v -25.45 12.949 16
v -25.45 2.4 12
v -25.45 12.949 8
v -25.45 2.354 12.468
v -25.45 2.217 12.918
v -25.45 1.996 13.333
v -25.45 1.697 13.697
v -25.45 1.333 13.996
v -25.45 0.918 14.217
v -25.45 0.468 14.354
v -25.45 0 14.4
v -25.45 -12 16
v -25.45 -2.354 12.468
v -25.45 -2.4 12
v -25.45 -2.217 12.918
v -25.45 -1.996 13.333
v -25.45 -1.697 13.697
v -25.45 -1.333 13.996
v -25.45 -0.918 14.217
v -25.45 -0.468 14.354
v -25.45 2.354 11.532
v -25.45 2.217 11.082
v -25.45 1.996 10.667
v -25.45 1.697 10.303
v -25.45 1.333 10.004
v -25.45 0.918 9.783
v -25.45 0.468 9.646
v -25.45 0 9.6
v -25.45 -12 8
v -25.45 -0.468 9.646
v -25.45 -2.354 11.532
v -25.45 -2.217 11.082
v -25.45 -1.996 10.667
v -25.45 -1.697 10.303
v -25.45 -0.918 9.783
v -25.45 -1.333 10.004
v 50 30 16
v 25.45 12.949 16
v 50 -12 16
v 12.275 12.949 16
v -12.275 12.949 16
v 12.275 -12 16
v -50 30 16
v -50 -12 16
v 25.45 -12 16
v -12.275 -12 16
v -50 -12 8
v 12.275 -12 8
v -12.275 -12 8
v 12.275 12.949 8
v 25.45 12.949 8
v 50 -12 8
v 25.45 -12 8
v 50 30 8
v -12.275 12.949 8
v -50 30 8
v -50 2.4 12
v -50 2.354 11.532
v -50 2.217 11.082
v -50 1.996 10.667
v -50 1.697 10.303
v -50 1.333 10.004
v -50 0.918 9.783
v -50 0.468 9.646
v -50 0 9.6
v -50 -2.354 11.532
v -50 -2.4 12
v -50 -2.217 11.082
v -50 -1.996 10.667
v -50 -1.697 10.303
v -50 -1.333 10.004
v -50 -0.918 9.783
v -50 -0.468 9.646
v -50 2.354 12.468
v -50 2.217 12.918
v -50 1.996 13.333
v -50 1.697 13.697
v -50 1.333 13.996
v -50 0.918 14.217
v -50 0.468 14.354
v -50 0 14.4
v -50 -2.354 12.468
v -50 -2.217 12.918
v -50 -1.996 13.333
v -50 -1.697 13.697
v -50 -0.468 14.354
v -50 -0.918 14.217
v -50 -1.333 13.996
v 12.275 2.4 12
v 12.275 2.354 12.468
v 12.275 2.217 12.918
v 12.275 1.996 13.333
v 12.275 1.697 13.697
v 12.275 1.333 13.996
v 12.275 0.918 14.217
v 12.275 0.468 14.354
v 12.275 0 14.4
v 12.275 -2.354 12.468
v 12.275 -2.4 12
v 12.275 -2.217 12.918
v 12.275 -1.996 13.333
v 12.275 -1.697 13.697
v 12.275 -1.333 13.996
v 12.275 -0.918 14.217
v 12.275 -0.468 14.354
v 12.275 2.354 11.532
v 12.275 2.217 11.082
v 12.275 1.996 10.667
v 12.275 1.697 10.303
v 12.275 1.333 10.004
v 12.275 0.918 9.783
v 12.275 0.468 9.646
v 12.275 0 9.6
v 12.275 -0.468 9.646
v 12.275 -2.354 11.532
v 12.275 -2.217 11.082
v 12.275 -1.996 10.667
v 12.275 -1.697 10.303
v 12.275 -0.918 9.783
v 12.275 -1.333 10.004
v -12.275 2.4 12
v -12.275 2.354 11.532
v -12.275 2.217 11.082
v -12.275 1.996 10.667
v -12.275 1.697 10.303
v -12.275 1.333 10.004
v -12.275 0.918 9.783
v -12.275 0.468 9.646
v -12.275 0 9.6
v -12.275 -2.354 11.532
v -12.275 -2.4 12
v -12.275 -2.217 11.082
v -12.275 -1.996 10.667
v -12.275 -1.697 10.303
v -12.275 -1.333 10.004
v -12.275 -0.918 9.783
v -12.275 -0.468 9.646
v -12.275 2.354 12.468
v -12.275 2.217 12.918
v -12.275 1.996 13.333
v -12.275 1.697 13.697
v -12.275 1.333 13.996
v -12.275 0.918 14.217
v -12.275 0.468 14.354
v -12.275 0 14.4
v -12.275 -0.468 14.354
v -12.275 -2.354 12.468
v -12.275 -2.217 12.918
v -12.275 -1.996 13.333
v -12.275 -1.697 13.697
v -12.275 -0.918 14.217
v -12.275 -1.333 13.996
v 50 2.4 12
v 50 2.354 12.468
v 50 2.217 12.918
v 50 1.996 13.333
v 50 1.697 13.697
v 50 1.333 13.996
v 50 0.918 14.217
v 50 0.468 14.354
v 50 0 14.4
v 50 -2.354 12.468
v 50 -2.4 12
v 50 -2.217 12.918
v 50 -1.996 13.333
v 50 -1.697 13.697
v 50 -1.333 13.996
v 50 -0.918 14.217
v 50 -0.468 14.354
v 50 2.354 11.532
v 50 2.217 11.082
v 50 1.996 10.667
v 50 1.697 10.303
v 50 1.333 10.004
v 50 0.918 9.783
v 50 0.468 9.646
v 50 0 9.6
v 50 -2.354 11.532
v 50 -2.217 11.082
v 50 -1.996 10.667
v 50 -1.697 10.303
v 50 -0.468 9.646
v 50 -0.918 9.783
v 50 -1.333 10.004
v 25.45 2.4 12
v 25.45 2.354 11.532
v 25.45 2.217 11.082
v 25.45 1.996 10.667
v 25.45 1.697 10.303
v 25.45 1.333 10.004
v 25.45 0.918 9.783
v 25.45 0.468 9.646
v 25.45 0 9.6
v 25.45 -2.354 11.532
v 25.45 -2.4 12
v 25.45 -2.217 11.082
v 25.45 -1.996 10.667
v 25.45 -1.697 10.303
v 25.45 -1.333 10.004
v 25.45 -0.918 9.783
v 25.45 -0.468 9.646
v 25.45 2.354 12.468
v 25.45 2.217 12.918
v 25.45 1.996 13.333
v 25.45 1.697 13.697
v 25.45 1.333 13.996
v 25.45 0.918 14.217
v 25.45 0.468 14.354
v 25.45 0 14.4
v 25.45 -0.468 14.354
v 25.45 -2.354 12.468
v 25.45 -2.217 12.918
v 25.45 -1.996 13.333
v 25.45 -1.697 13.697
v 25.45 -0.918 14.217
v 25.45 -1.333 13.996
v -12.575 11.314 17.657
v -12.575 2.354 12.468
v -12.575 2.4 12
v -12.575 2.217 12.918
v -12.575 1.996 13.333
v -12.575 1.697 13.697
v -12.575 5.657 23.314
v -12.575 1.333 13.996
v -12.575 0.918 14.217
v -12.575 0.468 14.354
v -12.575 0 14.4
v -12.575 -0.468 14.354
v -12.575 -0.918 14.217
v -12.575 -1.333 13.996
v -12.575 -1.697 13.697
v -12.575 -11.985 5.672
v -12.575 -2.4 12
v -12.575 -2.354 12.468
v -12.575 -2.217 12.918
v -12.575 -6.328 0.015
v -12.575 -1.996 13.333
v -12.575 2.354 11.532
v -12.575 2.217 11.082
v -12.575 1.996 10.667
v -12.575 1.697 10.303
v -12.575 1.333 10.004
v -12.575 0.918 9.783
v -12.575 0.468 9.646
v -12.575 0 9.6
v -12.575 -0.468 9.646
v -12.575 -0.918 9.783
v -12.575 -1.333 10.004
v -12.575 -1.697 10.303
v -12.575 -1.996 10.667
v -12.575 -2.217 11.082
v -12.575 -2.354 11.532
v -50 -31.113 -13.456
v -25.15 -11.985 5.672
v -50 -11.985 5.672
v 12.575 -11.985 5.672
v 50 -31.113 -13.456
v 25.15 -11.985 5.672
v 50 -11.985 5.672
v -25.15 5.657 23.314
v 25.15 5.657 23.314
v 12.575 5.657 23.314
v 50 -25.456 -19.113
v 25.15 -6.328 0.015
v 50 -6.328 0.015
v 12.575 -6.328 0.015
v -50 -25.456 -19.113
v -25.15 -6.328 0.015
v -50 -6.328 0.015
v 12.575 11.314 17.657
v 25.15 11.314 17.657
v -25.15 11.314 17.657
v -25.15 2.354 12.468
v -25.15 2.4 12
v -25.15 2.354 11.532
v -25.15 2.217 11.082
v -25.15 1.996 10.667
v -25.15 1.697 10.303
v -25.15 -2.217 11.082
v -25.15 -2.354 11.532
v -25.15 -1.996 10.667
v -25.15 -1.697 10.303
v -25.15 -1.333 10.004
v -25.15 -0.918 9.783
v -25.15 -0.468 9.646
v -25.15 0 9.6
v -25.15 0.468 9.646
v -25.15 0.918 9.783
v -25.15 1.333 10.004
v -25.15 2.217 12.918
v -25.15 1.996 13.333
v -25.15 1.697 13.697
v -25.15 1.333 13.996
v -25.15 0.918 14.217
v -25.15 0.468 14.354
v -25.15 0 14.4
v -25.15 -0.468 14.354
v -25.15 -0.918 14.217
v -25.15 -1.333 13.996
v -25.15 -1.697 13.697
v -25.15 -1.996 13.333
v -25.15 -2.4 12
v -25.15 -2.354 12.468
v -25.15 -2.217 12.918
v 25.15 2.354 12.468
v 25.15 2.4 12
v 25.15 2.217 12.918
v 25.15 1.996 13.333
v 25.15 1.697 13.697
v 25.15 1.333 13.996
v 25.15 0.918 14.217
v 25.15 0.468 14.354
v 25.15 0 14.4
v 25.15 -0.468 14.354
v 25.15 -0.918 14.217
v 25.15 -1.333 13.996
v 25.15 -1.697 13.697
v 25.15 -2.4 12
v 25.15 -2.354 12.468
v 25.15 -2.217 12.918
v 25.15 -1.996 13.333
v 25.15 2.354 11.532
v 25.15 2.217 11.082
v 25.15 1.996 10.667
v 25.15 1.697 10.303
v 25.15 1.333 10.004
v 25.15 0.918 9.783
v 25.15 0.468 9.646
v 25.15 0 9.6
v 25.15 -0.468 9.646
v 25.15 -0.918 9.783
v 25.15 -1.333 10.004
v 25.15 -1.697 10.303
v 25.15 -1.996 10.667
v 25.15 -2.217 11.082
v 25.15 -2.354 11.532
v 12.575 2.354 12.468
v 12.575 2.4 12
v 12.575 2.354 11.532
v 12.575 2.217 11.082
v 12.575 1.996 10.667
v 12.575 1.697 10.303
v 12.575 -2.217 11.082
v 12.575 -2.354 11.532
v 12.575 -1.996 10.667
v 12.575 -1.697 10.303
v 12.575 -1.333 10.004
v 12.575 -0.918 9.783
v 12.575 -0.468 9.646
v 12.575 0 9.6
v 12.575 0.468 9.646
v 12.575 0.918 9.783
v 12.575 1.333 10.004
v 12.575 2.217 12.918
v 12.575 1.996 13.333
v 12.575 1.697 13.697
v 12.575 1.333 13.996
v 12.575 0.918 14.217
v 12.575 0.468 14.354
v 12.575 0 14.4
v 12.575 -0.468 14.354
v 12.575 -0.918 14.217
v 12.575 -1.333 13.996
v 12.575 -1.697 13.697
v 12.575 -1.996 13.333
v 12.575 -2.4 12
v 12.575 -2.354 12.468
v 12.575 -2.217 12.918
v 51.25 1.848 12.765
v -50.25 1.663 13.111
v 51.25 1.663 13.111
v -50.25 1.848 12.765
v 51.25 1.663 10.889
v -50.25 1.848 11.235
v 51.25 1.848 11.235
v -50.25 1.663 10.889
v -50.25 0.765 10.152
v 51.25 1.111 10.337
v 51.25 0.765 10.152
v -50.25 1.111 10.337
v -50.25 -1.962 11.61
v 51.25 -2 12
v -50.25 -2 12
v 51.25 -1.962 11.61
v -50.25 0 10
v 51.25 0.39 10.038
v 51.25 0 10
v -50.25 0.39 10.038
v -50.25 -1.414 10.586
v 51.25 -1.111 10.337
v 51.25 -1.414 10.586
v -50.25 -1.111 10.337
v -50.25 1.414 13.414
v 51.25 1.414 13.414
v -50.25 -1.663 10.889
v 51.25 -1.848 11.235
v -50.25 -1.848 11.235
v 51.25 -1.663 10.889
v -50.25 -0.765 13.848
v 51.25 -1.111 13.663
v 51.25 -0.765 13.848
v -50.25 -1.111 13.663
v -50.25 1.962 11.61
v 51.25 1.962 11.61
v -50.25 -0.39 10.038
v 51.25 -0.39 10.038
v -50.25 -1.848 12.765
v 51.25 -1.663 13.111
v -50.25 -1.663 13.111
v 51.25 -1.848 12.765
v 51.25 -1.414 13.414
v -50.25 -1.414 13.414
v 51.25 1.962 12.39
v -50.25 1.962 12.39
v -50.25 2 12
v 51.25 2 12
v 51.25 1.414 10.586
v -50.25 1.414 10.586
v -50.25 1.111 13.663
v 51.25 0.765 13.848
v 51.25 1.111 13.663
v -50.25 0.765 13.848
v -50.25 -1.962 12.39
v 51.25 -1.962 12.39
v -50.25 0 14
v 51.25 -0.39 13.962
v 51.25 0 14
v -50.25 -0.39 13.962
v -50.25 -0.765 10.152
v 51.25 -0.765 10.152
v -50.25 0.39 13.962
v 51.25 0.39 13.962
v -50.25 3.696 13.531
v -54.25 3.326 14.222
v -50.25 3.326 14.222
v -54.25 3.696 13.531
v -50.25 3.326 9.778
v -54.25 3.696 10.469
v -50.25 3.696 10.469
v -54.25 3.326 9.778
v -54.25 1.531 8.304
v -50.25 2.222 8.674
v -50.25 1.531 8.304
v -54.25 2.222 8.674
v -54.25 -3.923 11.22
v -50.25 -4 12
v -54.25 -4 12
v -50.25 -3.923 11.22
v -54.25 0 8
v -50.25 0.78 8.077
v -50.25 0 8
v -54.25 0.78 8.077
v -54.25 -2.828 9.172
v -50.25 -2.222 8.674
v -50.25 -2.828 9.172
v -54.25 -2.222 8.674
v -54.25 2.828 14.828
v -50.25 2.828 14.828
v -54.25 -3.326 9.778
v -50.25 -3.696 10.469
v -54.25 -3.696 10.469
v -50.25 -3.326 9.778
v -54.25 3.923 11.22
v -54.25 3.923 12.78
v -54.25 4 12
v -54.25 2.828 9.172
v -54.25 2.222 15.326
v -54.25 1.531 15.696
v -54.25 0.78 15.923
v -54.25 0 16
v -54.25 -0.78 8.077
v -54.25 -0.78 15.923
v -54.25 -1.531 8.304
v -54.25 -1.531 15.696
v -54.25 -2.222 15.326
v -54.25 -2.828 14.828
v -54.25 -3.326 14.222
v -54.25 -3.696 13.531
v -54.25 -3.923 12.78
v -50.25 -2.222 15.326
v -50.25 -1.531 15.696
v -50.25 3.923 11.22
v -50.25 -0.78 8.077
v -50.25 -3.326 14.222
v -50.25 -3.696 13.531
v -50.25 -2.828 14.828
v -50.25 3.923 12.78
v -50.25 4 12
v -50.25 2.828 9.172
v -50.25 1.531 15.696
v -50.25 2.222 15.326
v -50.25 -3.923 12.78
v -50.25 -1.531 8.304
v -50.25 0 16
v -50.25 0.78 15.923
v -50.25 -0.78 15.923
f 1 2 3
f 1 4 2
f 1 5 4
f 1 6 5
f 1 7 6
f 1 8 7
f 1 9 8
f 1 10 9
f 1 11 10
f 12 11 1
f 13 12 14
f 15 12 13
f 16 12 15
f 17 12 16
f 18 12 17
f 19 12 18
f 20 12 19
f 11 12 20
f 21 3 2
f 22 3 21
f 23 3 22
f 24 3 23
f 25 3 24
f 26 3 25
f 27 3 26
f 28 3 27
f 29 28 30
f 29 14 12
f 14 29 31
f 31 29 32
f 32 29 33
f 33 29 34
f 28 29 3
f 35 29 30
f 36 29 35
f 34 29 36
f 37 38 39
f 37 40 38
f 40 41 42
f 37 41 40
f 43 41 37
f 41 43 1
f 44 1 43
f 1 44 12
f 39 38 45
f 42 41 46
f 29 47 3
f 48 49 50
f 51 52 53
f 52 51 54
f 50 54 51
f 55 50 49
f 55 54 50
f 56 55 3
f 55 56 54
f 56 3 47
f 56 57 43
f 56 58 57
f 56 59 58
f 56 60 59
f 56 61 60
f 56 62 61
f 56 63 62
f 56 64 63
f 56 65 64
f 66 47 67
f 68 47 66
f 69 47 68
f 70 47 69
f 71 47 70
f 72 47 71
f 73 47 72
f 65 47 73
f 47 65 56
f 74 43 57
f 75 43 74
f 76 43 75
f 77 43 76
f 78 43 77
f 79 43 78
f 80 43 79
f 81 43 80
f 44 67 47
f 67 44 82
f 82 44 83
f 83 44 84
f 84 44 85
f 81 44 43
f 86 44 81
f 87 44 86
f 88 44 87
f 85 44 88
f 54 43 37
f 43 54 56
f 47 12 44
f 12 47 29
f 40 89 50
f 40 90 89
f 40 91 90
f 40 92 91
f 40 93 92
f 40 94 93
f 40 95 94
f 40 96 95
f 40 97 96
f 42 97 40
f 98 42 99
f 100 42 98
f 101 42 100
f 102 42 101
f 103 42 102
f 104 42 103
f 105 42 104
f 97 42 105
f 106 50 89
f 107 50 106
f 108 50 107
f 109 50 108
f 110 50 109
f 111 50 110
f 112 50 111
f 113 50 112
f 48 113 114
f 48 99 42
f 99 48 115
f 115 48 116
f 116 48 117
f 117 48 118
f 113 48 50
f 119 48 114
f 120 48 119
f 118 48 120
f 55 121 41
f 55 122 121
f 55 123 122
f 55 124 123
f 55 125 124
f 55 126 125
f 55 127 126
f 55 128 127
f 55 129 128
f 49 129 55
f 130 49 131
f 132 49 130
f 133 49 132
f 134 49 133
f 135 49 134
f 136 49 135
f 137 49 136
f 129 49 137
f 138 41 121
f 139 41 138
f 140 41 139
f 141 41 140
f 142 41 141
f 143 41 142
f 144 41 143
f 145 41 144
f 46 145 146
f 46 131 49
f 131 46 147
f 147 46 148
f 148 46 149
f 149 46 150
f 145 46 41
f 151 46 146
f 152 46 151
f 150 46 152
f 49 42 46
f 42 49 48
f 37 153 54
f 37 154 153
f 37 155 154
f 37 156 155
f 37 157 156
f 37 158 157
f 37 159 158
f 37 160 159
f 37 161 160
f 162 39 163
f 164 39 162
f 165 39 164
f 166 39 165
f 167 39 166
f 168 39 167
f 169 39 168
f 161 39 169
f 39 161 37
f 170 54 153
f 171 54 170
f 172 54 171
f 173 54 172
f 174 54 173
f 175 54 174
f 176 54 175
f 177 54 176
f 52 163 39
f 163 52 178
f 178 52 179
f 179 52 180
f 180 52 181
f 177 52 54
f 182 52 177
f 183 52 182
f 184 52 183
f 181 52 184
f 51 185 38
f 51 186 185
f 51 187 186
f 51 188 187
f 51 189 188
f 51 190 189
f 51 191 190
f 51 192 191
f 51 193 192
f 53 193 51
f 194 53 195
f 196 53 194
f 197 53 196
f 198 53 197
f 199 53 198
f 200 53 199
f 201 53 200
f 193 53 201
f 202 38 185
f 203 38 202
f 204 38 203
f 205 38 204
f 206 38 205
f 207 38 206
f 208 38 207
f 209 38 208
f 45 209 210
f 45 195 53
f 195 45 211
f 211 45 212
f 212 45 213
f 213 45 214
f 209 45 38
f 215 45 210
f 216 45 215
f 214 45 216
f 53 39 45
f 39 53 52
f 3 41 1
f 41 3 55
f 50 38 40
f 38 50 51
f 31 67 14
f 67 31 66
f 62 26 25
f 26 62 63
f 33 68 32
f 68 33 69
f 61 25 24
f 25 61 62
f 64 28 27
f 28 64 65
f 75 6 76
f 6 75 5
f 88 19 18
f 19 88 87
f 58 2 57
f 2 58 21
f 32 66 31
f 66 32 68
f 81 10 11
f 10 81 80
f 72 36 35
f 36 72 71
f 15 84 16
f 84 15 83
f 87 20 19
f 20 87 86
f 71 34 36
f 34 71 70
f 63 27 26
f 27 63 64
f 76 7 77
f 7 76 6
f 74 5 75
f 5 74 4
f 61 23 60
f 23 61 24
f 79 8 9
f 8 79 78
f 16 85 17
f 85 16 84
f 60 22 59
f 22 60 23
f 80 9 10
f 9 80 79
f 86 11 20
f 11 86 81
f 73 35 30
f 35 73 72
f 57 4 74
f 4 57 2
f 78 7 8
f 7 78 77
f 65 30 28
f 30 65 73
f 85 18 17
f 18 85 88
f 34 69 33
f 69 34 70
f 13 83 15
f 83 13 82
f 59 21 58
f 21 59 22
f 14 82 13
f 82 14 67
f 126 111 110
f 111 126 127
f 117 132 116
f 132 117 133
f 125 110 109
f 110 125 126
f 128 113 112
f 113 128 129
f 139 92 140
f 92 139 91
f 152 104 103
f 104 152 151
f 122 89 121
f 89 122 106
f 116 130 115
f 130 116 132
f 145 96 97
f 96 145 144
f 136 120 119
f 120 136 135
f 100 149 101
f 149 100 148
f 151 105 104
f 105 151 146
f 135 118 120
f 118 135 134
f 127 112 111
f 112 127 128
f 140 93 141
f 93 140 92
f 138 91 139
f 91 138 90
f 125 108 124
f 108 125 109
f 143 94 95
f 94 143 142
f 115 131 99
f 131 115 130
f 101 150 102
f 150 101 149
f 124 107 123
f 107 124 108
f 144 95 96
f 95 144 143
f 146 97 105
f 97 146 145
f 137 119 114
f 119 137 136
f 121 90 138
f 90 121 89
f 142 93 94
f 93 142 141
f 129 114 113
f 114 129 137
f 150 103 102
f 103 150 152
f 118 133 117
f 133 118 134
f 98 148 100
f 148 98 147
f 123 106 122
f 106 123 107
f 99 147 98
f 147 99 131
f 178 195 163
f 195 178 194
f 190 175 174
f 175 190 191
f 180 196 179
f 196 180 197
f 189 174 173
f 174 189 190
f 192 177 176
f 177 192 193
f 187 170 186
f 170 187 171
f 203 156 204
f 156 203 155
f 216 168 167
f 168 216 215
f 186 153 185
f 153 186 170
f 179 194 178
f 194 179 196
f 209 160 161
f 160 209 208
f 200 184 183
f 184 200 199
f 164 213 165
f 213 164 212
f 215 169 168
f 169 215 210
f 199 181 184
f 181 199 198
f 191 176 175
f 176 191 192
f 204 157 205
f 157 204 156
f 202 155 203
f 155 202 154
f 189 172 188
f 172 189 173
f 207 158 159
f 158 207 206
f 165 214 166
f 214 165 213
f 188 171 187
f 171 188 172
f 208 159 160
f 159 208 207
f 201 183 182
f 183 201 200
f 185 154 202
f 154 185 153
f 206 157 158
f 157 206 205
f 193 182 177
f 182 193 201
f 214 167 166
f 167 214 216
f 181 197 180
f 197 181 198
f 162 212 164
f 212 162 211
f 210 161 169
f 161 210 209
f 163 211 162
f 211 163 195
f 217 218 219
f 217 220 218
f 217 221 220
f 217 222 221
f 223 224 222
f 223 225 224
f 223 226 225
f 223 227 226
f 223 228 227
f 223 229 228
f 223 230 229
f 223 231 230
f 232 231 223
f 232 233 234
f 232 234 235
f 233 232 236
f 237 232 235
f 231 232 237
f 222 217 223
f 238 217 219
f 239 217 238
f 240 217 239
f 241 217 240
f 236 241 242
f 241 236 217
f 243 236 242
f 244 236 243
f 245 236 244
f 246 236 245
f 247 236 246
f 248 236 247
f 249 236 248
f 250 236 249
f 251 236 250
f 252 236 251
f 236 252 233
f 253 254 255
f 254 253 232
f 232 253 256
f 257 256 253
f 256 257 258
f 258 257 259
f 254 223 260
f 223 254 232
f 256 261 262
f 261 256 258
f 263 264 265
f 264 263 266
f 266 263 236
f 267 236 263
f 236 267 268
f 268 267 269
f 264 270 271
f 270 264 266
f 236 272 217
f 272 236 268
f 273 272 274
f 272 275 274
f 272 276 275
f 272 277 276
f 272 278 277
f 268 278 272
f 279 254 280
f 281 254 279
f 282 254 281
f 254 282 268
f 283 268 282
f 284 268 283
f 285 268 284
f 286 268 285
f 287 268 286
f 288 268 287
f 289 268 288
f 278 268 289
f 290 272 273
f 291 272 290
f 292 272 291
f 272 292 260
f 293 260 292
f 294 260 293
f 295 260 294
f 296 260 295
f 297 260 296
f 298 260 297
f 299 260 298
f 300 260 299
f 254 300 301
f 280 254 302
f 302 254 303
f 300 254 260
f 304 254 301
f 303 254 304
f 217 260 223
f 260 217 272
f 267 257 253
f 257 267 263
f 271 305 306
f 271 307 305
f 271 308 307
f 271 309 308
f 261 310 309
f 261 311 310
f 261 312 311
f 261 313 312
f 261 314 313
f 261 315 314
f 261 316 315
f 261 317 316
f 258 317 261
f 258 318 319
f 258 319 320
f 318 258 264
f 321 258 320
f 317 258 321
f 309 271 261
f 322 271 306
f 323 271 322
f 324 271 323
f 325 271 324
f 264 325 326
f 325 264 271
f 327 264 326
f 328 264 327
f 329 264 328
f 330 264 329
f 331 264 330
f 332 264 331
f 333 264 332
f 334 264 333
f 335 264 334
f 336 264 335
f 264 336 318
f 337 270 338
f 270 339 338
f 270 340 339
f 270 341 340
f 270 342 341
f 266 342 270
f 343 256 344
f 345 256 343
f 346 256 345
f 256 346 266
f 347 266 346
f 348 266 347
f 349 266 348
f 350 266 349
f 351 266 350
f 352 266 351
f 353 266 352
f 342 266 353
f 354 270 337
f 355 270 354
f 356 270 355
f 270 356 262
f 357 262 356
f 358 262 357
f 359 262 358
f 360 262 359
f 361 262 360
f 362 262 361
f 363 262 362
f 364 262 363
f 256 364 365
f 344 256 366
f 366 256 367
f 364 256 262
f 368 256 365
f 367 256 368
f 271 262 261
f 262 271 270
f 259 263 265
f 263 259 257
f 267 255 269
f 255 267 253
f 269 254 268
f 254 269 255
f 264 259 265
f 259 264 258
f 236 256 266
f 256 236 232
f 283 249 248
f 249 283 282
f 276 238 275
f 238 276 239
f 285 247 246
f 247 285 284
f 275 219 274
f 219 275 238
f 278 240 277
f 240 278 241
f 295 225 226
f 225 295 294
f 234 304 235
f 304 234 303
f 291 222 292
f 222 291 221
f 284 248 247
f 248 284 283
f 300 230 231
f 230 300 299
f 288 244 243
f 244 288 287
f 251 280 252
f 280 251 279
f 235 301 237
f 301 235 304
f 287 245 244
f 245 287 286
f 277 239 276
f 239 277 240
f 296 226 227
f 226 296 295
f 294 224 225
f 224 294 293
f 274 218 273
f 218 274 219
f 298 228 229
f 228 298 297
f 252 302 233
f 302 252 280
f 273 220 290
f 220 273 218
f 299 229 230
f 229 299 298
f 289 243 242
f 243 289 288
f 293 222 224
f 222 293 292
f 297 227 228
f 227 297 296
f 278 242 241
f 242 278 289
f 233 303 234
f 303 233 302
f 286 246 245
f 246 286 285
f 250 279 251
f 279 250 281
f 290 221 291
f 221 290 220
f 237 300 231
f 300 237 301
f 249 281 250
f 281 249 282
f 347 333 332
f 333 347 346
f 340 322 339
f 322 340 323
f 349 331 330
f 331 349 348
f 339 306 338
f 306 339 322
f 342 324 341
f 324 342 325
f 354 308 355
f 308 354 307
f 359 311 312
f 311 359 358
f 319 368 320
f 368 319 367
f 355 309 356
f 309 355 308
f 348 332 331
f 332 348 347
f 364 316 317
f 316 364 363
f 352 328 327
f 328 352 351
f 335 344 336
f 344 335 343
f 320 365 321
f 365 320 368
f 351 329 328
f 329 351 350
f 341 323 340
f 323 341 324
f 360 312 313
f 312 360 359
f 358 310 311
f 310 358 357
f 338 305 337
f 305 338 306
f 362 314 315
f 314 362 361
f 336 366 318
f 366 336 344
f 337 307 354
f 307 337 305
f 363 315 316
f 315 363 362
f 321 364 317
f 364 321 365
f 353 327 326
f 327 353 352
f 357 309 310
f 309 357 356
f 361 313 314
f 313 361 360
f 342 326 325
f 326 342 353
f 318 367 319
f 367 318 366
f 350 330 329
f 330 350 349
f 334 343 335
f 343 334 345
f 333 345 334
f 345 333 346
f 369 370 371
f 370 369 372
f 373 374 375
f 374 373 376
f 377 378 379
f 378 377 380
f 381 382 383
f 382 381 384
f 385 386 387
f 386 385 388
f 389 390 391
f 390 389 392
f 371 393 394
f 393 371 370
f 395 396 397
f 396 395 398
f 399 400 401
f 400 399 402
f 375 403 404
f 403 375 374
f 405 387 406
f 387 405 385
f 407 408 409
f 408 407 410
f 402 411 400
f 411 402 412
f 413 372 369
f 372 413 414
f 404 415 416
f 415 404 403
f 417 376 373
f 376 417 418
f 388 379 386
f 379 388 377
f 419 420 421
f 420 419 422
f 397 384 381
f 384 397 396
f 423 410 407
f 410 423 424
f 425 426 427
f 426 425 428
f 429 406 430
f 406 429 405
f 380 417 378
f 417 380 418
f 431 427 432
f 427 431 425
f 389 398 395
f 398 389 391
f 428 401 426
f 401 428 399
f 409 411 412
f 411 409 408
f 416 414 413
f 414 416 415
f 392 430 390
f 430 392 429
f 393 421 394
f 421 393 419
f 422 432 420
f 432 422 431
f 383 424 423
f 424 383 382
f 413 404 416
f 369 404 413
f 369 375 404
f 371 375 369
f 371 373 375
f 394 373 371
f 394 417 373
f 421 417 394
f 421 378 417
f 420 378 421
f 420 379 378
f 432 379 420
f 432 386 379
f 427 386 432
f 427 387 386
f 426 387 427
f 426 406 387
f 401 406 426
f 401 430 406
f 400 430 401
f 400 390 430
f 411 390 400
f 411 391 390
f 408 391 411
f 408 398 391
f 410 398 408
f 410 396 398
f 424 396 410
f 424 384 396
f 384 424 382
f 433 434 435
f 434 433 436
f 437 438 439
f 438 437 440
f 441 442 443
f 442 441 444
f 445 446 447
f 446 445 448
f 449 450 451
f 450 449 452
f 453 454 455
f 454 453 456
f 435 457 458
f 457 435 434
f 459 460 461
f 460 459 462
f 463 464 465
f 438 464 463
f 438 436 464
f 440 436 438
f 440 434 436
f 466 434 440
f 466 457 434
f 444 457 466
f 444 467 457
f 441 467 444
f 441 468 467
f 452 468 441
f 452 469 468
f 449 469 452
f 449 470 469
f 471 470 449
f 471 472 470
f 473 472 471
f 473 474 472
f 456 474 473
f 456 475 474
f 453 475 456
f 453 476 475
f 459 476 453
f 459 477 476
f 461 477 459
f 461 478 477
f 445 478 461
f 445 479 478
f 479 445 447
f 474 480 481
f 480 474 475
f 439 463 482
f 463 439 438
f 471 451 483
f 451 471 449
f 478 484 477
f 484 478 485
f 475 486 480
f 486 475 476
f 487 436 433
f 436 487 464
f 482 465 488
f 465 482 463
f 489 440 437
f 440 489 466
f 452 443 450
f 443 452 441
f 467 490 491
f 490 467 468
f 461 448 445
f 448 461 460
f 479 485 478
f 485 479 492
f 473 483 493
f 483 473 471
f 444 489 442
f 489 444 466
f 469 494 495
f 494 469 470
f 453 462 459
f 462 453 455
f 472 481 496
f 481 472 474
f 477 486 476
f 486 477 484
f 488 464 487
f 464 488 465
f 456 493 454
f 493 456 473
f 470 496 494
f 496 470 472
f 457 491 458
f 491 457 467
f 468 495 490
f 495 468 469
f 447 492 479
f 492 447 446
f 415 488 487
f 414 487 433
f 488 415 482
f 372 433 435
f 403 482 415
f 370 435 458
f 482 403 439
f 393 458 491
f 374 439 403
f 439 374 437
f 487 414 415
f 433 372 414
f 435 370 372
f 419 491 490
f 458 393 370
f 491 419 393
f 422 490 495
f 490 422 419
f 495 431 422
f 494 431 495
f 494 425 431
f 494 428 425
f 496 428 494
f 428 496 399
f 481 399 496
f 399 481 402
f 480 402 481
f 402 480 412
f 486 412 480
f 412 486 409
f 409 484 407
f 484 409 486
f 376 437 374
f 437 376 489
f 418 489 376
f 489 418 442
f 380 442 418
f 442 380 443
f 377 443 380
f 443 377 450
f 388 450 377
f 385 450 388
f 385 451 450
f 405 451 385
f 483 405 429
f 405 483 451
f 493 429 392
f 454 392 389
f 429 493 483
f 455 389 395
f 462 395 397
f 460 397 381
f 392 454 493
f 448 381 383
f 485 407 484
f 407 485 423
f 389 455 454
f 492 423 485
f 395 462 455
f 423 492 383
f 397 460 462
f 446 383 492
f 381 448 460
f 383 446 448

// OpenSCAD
$fn = 32;

// ------------------------------------------------------------------------
// Butt hinge: hinge 100 mm, leaf swung 45 deg
// Every part is its own module, assembly() places every instance.
// ------------------------------------------------------------------------

// --- part 1 ---
module hinge_base() {
  difference() {
    union() {
      translate([-50, -12, -4]) cube([24.55, 42, 8]);
      translate([-12.275, -12, -4]) cube([24.55, 42, 8]);
      translate([25.45, -12, -4]) cube([24.55, 42, 8]);
      translate([-50, 12.949, -4]) cube([100, 17.051, 8]);
    }
    translate([-37.725, 0, 0]) rotate([0, 90, 0]) cylinder(h = 26.55, d = 4.8, center = true);
    translate([0, 0, 0]) rotate([0, 90, 0]) cylinder(h = 26.55, d = 4.8, center = true);
    translate([37.725, 0, 0]) rotate([0, 90, 0]) cylinder(h = 26.55, d = 4.8, center = true);
  }
}

// --- part 2 ---
module hinge_mover() {
  difference() {
    union() {
      translate([-25.15, -40, -4]) cube([12.575, 52, 8]);
      translate([12.575, -40, -4]) cube([12.575, 52, 8]);
      translate([-50, -40, -4]) cube([100, 27.051, 8]);
    }
    translate([-18.863, 0, 0]) rotate([0, 90, 0]) cylinder(h = 14.575, d = 4.8, center = true);
    translate([18.863, 0, 0]) rotate([0, 90, 0]) cylinder(h = 14.575, d = 4.8, center = true);
  }
}

// --- part 3 ---
module hinge_pin() {
  rotate([0, 90, 0]) cylinder(h = 102.5, d = 4, center = true);
  translate([-54.25, 0, 0]) rotate([0, 90, 0]) cylinder(h = 4, d = 8);
}

// --- assembly ---
module assembly() {
  color([0.80, 0.24, 0.20]) translate([0, 0, 12]) rotate([0, 0, 0]) hinge_base();
  color([0.20, 0.45, 0.75]) translate([0, 0, 12]) rotate([45, 0, 0]) hinge_mover();
  color([0.25, 0.62, 0.32]) translate([0, 0, 12]) rotate([0, 0, 0]) hinge_pin();
}

assembly();
